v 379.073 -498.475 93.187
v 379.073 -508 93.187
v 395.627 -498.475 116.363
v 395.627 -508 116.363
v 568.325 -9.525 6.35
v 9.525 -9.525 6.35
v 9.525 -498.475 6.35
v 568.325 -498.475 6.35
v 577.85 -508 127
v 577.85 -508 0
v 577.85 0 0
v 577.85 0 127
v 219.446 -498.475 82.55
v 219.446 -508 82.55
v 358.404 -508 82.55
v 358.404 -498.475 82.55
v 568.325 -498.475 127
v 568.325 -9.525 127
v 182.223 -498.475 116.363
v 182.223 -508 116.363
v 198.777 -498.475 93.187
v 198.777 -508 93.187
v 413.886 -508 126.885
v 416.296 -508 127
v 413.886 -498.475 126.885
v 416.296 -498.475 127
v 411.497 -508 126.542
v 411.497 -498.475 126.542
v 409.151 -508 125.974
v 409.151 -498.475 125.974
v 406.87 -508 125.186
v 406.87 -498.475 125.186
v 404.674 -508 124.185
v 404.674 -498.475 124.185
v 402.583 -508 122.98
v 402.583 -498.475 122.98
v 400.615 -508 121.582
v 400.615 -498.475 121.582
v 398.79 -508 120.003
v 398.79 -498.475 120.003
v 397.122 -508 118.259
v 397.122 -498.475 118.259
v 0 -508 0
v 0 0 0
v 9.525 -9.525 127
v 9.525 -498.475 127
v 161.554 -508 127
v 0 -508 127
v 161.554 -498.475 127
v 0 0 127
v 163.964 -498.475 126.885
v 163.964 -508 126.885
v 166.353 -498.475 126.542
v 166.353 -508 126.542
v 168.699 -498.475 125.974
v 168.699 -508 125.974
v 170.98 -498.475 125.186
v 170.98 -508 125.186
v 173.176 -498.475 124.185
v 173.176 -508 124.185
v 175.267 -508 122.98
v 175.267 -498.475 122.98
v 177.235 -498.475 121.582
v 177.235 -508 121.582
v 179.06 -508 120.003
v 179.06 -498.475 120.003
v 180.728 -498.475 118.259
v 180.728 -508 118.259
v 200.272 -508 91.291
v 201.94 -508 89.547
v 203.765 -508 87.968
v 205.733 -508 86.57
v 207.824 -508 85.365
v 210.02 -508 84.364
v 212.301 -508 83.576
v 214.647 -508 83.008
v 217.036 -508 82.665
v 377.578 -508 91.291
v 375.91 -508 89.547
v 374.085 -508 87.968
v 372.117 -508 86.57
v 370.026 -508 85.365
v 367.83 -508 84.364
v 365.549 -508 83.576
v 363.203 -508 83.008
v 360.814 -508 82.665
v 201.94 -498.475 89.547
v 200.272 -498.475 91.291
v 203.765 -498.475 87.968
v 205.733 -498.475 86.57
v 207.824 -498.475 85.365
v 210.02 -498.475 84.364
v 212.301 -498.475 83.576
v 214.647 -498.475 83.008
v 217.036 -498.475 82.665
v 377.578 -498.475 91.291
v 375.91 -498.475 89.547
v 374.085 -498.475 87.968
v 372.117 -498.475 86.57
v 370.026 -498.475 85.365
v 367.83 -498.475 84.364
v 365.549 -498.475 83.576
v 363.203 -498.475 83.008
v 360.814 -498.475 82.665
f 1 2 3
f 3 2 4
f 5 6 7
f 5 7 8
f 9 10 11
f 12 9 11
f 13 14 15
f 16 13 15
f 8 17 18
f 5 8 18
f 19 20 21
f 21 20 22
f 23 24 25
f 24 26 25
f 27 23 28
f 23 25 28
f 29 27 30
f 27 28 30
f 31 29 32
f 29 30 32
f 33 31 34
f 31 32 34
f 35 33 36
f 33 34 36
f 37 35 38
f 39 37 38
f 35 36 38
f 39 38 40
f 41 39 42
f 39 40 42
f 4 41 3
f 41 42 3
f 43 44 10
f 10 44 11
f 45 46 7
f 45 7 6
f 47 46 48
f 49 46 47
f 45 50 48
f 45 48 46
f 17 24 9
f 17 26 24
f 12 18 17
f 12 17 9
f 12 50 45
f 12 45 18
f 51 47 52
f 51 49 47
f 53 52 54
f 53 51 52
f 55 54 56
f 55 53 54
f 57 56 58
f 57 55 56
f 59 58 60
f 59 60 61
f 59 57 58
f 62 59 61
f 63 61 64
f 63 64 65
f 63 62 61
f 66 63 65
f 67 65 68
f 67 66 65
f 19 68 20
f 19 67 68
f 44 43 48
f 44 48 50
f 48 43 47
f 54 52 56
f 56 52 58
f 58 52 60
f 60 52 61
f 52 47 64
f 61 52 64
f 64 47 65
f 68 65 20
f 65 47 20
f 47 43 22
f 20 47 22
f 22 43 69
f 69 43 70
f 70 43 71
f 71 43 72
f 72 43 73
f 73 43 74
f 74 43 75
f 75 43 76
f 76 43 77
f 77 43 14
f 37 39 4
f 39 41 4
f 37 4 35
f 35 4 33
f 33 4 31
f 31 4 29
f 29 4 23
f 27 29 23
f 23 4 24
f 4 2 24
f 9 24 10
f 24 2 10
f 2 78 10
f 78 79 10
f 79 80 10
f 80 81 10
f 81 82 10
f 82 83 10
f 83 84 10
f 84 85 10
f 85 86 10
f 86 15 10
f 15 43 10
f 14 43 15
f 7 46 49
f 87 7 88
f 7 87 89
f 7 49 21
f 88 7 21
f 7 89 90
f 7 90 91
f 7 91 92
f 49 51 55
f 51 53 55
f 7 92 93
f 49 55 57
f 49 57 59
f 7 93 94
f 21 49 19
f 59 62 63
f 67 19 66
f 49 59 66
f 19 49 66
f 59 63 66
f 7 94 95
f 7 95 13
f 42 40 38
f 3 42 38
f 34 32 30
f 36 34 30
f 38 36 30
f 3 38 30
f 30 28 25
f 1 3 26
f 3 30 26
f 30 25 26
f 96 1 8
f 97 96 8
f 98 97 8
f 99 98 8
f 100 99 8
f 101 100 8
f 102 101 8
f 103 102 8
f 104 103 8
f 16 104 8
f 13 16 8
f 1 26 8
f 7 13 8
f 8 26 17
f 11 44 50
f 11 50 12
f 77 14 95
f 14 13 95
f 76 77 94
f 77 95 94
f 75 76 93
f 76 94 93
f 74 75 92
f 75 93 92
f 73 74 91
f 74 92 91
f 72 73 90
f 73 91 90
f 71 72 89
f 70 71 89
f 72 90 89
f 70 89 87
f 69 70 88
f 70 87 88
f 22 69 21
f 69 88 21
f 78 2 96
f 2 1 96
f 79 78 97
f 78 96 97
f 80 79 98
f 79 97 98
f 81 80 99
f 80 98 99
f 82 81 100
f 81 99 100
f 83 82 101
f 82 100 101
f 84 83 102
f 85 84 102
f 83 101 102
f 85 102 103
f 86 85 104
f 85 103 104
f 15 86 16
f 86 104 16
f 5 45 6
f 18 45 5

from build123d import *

# Parameters (mm, degrees)
F0_W     = 577.85
F0_H     = 508
F1_DEPTH = 127
F2_W     = 558.8
F2_H     = 488.95
F3_DEPTH = 120.65
F5_DEPTH = 9.525
F6_R     = 25.4


with BuildPart() as f1:
    # F0 (on Top) → F1 (new body)
    with BuildSketch(Plane.XY):
        with Locations((288.925, -254)):
            Rectangle(F0_W, F0_H)
    extrude(amount=F1_DEPTH)

    # F2 (on face) → F3 (cut)
    with BuildSketch(Plane.XY.offset(127)):
        with Locations((288.925, -254)):
            Rectangle(F2_W, F2_H)
    extrude(amount=-F3_DEPTH, mode=Mode.SUBTRACT)

    # F4 (on face) → F5 (cut, through all)
    with BuildSketch(Plane.XZ.offset(508)):
        Polygon((403.225, 127), (174.625, 127), (206.375, 82.55), (371.475, 82.55), align=None)
    extrude(amount=-F5_DEPTH, mode=Mode.SUBTRACT)

    # F6
    f6_edges = [f1.edges().sort_by_distance(p)[0] for p in [
        (403.225, -503.2375, 127),
        (371.475, -503.2375, 82.55),
        (174.625, -503.2375, 127),
        (206.375, -503.2375, 82.55),
    ]]
    fillet(f6_edges, radius=F6_R)


solid = f1.part
